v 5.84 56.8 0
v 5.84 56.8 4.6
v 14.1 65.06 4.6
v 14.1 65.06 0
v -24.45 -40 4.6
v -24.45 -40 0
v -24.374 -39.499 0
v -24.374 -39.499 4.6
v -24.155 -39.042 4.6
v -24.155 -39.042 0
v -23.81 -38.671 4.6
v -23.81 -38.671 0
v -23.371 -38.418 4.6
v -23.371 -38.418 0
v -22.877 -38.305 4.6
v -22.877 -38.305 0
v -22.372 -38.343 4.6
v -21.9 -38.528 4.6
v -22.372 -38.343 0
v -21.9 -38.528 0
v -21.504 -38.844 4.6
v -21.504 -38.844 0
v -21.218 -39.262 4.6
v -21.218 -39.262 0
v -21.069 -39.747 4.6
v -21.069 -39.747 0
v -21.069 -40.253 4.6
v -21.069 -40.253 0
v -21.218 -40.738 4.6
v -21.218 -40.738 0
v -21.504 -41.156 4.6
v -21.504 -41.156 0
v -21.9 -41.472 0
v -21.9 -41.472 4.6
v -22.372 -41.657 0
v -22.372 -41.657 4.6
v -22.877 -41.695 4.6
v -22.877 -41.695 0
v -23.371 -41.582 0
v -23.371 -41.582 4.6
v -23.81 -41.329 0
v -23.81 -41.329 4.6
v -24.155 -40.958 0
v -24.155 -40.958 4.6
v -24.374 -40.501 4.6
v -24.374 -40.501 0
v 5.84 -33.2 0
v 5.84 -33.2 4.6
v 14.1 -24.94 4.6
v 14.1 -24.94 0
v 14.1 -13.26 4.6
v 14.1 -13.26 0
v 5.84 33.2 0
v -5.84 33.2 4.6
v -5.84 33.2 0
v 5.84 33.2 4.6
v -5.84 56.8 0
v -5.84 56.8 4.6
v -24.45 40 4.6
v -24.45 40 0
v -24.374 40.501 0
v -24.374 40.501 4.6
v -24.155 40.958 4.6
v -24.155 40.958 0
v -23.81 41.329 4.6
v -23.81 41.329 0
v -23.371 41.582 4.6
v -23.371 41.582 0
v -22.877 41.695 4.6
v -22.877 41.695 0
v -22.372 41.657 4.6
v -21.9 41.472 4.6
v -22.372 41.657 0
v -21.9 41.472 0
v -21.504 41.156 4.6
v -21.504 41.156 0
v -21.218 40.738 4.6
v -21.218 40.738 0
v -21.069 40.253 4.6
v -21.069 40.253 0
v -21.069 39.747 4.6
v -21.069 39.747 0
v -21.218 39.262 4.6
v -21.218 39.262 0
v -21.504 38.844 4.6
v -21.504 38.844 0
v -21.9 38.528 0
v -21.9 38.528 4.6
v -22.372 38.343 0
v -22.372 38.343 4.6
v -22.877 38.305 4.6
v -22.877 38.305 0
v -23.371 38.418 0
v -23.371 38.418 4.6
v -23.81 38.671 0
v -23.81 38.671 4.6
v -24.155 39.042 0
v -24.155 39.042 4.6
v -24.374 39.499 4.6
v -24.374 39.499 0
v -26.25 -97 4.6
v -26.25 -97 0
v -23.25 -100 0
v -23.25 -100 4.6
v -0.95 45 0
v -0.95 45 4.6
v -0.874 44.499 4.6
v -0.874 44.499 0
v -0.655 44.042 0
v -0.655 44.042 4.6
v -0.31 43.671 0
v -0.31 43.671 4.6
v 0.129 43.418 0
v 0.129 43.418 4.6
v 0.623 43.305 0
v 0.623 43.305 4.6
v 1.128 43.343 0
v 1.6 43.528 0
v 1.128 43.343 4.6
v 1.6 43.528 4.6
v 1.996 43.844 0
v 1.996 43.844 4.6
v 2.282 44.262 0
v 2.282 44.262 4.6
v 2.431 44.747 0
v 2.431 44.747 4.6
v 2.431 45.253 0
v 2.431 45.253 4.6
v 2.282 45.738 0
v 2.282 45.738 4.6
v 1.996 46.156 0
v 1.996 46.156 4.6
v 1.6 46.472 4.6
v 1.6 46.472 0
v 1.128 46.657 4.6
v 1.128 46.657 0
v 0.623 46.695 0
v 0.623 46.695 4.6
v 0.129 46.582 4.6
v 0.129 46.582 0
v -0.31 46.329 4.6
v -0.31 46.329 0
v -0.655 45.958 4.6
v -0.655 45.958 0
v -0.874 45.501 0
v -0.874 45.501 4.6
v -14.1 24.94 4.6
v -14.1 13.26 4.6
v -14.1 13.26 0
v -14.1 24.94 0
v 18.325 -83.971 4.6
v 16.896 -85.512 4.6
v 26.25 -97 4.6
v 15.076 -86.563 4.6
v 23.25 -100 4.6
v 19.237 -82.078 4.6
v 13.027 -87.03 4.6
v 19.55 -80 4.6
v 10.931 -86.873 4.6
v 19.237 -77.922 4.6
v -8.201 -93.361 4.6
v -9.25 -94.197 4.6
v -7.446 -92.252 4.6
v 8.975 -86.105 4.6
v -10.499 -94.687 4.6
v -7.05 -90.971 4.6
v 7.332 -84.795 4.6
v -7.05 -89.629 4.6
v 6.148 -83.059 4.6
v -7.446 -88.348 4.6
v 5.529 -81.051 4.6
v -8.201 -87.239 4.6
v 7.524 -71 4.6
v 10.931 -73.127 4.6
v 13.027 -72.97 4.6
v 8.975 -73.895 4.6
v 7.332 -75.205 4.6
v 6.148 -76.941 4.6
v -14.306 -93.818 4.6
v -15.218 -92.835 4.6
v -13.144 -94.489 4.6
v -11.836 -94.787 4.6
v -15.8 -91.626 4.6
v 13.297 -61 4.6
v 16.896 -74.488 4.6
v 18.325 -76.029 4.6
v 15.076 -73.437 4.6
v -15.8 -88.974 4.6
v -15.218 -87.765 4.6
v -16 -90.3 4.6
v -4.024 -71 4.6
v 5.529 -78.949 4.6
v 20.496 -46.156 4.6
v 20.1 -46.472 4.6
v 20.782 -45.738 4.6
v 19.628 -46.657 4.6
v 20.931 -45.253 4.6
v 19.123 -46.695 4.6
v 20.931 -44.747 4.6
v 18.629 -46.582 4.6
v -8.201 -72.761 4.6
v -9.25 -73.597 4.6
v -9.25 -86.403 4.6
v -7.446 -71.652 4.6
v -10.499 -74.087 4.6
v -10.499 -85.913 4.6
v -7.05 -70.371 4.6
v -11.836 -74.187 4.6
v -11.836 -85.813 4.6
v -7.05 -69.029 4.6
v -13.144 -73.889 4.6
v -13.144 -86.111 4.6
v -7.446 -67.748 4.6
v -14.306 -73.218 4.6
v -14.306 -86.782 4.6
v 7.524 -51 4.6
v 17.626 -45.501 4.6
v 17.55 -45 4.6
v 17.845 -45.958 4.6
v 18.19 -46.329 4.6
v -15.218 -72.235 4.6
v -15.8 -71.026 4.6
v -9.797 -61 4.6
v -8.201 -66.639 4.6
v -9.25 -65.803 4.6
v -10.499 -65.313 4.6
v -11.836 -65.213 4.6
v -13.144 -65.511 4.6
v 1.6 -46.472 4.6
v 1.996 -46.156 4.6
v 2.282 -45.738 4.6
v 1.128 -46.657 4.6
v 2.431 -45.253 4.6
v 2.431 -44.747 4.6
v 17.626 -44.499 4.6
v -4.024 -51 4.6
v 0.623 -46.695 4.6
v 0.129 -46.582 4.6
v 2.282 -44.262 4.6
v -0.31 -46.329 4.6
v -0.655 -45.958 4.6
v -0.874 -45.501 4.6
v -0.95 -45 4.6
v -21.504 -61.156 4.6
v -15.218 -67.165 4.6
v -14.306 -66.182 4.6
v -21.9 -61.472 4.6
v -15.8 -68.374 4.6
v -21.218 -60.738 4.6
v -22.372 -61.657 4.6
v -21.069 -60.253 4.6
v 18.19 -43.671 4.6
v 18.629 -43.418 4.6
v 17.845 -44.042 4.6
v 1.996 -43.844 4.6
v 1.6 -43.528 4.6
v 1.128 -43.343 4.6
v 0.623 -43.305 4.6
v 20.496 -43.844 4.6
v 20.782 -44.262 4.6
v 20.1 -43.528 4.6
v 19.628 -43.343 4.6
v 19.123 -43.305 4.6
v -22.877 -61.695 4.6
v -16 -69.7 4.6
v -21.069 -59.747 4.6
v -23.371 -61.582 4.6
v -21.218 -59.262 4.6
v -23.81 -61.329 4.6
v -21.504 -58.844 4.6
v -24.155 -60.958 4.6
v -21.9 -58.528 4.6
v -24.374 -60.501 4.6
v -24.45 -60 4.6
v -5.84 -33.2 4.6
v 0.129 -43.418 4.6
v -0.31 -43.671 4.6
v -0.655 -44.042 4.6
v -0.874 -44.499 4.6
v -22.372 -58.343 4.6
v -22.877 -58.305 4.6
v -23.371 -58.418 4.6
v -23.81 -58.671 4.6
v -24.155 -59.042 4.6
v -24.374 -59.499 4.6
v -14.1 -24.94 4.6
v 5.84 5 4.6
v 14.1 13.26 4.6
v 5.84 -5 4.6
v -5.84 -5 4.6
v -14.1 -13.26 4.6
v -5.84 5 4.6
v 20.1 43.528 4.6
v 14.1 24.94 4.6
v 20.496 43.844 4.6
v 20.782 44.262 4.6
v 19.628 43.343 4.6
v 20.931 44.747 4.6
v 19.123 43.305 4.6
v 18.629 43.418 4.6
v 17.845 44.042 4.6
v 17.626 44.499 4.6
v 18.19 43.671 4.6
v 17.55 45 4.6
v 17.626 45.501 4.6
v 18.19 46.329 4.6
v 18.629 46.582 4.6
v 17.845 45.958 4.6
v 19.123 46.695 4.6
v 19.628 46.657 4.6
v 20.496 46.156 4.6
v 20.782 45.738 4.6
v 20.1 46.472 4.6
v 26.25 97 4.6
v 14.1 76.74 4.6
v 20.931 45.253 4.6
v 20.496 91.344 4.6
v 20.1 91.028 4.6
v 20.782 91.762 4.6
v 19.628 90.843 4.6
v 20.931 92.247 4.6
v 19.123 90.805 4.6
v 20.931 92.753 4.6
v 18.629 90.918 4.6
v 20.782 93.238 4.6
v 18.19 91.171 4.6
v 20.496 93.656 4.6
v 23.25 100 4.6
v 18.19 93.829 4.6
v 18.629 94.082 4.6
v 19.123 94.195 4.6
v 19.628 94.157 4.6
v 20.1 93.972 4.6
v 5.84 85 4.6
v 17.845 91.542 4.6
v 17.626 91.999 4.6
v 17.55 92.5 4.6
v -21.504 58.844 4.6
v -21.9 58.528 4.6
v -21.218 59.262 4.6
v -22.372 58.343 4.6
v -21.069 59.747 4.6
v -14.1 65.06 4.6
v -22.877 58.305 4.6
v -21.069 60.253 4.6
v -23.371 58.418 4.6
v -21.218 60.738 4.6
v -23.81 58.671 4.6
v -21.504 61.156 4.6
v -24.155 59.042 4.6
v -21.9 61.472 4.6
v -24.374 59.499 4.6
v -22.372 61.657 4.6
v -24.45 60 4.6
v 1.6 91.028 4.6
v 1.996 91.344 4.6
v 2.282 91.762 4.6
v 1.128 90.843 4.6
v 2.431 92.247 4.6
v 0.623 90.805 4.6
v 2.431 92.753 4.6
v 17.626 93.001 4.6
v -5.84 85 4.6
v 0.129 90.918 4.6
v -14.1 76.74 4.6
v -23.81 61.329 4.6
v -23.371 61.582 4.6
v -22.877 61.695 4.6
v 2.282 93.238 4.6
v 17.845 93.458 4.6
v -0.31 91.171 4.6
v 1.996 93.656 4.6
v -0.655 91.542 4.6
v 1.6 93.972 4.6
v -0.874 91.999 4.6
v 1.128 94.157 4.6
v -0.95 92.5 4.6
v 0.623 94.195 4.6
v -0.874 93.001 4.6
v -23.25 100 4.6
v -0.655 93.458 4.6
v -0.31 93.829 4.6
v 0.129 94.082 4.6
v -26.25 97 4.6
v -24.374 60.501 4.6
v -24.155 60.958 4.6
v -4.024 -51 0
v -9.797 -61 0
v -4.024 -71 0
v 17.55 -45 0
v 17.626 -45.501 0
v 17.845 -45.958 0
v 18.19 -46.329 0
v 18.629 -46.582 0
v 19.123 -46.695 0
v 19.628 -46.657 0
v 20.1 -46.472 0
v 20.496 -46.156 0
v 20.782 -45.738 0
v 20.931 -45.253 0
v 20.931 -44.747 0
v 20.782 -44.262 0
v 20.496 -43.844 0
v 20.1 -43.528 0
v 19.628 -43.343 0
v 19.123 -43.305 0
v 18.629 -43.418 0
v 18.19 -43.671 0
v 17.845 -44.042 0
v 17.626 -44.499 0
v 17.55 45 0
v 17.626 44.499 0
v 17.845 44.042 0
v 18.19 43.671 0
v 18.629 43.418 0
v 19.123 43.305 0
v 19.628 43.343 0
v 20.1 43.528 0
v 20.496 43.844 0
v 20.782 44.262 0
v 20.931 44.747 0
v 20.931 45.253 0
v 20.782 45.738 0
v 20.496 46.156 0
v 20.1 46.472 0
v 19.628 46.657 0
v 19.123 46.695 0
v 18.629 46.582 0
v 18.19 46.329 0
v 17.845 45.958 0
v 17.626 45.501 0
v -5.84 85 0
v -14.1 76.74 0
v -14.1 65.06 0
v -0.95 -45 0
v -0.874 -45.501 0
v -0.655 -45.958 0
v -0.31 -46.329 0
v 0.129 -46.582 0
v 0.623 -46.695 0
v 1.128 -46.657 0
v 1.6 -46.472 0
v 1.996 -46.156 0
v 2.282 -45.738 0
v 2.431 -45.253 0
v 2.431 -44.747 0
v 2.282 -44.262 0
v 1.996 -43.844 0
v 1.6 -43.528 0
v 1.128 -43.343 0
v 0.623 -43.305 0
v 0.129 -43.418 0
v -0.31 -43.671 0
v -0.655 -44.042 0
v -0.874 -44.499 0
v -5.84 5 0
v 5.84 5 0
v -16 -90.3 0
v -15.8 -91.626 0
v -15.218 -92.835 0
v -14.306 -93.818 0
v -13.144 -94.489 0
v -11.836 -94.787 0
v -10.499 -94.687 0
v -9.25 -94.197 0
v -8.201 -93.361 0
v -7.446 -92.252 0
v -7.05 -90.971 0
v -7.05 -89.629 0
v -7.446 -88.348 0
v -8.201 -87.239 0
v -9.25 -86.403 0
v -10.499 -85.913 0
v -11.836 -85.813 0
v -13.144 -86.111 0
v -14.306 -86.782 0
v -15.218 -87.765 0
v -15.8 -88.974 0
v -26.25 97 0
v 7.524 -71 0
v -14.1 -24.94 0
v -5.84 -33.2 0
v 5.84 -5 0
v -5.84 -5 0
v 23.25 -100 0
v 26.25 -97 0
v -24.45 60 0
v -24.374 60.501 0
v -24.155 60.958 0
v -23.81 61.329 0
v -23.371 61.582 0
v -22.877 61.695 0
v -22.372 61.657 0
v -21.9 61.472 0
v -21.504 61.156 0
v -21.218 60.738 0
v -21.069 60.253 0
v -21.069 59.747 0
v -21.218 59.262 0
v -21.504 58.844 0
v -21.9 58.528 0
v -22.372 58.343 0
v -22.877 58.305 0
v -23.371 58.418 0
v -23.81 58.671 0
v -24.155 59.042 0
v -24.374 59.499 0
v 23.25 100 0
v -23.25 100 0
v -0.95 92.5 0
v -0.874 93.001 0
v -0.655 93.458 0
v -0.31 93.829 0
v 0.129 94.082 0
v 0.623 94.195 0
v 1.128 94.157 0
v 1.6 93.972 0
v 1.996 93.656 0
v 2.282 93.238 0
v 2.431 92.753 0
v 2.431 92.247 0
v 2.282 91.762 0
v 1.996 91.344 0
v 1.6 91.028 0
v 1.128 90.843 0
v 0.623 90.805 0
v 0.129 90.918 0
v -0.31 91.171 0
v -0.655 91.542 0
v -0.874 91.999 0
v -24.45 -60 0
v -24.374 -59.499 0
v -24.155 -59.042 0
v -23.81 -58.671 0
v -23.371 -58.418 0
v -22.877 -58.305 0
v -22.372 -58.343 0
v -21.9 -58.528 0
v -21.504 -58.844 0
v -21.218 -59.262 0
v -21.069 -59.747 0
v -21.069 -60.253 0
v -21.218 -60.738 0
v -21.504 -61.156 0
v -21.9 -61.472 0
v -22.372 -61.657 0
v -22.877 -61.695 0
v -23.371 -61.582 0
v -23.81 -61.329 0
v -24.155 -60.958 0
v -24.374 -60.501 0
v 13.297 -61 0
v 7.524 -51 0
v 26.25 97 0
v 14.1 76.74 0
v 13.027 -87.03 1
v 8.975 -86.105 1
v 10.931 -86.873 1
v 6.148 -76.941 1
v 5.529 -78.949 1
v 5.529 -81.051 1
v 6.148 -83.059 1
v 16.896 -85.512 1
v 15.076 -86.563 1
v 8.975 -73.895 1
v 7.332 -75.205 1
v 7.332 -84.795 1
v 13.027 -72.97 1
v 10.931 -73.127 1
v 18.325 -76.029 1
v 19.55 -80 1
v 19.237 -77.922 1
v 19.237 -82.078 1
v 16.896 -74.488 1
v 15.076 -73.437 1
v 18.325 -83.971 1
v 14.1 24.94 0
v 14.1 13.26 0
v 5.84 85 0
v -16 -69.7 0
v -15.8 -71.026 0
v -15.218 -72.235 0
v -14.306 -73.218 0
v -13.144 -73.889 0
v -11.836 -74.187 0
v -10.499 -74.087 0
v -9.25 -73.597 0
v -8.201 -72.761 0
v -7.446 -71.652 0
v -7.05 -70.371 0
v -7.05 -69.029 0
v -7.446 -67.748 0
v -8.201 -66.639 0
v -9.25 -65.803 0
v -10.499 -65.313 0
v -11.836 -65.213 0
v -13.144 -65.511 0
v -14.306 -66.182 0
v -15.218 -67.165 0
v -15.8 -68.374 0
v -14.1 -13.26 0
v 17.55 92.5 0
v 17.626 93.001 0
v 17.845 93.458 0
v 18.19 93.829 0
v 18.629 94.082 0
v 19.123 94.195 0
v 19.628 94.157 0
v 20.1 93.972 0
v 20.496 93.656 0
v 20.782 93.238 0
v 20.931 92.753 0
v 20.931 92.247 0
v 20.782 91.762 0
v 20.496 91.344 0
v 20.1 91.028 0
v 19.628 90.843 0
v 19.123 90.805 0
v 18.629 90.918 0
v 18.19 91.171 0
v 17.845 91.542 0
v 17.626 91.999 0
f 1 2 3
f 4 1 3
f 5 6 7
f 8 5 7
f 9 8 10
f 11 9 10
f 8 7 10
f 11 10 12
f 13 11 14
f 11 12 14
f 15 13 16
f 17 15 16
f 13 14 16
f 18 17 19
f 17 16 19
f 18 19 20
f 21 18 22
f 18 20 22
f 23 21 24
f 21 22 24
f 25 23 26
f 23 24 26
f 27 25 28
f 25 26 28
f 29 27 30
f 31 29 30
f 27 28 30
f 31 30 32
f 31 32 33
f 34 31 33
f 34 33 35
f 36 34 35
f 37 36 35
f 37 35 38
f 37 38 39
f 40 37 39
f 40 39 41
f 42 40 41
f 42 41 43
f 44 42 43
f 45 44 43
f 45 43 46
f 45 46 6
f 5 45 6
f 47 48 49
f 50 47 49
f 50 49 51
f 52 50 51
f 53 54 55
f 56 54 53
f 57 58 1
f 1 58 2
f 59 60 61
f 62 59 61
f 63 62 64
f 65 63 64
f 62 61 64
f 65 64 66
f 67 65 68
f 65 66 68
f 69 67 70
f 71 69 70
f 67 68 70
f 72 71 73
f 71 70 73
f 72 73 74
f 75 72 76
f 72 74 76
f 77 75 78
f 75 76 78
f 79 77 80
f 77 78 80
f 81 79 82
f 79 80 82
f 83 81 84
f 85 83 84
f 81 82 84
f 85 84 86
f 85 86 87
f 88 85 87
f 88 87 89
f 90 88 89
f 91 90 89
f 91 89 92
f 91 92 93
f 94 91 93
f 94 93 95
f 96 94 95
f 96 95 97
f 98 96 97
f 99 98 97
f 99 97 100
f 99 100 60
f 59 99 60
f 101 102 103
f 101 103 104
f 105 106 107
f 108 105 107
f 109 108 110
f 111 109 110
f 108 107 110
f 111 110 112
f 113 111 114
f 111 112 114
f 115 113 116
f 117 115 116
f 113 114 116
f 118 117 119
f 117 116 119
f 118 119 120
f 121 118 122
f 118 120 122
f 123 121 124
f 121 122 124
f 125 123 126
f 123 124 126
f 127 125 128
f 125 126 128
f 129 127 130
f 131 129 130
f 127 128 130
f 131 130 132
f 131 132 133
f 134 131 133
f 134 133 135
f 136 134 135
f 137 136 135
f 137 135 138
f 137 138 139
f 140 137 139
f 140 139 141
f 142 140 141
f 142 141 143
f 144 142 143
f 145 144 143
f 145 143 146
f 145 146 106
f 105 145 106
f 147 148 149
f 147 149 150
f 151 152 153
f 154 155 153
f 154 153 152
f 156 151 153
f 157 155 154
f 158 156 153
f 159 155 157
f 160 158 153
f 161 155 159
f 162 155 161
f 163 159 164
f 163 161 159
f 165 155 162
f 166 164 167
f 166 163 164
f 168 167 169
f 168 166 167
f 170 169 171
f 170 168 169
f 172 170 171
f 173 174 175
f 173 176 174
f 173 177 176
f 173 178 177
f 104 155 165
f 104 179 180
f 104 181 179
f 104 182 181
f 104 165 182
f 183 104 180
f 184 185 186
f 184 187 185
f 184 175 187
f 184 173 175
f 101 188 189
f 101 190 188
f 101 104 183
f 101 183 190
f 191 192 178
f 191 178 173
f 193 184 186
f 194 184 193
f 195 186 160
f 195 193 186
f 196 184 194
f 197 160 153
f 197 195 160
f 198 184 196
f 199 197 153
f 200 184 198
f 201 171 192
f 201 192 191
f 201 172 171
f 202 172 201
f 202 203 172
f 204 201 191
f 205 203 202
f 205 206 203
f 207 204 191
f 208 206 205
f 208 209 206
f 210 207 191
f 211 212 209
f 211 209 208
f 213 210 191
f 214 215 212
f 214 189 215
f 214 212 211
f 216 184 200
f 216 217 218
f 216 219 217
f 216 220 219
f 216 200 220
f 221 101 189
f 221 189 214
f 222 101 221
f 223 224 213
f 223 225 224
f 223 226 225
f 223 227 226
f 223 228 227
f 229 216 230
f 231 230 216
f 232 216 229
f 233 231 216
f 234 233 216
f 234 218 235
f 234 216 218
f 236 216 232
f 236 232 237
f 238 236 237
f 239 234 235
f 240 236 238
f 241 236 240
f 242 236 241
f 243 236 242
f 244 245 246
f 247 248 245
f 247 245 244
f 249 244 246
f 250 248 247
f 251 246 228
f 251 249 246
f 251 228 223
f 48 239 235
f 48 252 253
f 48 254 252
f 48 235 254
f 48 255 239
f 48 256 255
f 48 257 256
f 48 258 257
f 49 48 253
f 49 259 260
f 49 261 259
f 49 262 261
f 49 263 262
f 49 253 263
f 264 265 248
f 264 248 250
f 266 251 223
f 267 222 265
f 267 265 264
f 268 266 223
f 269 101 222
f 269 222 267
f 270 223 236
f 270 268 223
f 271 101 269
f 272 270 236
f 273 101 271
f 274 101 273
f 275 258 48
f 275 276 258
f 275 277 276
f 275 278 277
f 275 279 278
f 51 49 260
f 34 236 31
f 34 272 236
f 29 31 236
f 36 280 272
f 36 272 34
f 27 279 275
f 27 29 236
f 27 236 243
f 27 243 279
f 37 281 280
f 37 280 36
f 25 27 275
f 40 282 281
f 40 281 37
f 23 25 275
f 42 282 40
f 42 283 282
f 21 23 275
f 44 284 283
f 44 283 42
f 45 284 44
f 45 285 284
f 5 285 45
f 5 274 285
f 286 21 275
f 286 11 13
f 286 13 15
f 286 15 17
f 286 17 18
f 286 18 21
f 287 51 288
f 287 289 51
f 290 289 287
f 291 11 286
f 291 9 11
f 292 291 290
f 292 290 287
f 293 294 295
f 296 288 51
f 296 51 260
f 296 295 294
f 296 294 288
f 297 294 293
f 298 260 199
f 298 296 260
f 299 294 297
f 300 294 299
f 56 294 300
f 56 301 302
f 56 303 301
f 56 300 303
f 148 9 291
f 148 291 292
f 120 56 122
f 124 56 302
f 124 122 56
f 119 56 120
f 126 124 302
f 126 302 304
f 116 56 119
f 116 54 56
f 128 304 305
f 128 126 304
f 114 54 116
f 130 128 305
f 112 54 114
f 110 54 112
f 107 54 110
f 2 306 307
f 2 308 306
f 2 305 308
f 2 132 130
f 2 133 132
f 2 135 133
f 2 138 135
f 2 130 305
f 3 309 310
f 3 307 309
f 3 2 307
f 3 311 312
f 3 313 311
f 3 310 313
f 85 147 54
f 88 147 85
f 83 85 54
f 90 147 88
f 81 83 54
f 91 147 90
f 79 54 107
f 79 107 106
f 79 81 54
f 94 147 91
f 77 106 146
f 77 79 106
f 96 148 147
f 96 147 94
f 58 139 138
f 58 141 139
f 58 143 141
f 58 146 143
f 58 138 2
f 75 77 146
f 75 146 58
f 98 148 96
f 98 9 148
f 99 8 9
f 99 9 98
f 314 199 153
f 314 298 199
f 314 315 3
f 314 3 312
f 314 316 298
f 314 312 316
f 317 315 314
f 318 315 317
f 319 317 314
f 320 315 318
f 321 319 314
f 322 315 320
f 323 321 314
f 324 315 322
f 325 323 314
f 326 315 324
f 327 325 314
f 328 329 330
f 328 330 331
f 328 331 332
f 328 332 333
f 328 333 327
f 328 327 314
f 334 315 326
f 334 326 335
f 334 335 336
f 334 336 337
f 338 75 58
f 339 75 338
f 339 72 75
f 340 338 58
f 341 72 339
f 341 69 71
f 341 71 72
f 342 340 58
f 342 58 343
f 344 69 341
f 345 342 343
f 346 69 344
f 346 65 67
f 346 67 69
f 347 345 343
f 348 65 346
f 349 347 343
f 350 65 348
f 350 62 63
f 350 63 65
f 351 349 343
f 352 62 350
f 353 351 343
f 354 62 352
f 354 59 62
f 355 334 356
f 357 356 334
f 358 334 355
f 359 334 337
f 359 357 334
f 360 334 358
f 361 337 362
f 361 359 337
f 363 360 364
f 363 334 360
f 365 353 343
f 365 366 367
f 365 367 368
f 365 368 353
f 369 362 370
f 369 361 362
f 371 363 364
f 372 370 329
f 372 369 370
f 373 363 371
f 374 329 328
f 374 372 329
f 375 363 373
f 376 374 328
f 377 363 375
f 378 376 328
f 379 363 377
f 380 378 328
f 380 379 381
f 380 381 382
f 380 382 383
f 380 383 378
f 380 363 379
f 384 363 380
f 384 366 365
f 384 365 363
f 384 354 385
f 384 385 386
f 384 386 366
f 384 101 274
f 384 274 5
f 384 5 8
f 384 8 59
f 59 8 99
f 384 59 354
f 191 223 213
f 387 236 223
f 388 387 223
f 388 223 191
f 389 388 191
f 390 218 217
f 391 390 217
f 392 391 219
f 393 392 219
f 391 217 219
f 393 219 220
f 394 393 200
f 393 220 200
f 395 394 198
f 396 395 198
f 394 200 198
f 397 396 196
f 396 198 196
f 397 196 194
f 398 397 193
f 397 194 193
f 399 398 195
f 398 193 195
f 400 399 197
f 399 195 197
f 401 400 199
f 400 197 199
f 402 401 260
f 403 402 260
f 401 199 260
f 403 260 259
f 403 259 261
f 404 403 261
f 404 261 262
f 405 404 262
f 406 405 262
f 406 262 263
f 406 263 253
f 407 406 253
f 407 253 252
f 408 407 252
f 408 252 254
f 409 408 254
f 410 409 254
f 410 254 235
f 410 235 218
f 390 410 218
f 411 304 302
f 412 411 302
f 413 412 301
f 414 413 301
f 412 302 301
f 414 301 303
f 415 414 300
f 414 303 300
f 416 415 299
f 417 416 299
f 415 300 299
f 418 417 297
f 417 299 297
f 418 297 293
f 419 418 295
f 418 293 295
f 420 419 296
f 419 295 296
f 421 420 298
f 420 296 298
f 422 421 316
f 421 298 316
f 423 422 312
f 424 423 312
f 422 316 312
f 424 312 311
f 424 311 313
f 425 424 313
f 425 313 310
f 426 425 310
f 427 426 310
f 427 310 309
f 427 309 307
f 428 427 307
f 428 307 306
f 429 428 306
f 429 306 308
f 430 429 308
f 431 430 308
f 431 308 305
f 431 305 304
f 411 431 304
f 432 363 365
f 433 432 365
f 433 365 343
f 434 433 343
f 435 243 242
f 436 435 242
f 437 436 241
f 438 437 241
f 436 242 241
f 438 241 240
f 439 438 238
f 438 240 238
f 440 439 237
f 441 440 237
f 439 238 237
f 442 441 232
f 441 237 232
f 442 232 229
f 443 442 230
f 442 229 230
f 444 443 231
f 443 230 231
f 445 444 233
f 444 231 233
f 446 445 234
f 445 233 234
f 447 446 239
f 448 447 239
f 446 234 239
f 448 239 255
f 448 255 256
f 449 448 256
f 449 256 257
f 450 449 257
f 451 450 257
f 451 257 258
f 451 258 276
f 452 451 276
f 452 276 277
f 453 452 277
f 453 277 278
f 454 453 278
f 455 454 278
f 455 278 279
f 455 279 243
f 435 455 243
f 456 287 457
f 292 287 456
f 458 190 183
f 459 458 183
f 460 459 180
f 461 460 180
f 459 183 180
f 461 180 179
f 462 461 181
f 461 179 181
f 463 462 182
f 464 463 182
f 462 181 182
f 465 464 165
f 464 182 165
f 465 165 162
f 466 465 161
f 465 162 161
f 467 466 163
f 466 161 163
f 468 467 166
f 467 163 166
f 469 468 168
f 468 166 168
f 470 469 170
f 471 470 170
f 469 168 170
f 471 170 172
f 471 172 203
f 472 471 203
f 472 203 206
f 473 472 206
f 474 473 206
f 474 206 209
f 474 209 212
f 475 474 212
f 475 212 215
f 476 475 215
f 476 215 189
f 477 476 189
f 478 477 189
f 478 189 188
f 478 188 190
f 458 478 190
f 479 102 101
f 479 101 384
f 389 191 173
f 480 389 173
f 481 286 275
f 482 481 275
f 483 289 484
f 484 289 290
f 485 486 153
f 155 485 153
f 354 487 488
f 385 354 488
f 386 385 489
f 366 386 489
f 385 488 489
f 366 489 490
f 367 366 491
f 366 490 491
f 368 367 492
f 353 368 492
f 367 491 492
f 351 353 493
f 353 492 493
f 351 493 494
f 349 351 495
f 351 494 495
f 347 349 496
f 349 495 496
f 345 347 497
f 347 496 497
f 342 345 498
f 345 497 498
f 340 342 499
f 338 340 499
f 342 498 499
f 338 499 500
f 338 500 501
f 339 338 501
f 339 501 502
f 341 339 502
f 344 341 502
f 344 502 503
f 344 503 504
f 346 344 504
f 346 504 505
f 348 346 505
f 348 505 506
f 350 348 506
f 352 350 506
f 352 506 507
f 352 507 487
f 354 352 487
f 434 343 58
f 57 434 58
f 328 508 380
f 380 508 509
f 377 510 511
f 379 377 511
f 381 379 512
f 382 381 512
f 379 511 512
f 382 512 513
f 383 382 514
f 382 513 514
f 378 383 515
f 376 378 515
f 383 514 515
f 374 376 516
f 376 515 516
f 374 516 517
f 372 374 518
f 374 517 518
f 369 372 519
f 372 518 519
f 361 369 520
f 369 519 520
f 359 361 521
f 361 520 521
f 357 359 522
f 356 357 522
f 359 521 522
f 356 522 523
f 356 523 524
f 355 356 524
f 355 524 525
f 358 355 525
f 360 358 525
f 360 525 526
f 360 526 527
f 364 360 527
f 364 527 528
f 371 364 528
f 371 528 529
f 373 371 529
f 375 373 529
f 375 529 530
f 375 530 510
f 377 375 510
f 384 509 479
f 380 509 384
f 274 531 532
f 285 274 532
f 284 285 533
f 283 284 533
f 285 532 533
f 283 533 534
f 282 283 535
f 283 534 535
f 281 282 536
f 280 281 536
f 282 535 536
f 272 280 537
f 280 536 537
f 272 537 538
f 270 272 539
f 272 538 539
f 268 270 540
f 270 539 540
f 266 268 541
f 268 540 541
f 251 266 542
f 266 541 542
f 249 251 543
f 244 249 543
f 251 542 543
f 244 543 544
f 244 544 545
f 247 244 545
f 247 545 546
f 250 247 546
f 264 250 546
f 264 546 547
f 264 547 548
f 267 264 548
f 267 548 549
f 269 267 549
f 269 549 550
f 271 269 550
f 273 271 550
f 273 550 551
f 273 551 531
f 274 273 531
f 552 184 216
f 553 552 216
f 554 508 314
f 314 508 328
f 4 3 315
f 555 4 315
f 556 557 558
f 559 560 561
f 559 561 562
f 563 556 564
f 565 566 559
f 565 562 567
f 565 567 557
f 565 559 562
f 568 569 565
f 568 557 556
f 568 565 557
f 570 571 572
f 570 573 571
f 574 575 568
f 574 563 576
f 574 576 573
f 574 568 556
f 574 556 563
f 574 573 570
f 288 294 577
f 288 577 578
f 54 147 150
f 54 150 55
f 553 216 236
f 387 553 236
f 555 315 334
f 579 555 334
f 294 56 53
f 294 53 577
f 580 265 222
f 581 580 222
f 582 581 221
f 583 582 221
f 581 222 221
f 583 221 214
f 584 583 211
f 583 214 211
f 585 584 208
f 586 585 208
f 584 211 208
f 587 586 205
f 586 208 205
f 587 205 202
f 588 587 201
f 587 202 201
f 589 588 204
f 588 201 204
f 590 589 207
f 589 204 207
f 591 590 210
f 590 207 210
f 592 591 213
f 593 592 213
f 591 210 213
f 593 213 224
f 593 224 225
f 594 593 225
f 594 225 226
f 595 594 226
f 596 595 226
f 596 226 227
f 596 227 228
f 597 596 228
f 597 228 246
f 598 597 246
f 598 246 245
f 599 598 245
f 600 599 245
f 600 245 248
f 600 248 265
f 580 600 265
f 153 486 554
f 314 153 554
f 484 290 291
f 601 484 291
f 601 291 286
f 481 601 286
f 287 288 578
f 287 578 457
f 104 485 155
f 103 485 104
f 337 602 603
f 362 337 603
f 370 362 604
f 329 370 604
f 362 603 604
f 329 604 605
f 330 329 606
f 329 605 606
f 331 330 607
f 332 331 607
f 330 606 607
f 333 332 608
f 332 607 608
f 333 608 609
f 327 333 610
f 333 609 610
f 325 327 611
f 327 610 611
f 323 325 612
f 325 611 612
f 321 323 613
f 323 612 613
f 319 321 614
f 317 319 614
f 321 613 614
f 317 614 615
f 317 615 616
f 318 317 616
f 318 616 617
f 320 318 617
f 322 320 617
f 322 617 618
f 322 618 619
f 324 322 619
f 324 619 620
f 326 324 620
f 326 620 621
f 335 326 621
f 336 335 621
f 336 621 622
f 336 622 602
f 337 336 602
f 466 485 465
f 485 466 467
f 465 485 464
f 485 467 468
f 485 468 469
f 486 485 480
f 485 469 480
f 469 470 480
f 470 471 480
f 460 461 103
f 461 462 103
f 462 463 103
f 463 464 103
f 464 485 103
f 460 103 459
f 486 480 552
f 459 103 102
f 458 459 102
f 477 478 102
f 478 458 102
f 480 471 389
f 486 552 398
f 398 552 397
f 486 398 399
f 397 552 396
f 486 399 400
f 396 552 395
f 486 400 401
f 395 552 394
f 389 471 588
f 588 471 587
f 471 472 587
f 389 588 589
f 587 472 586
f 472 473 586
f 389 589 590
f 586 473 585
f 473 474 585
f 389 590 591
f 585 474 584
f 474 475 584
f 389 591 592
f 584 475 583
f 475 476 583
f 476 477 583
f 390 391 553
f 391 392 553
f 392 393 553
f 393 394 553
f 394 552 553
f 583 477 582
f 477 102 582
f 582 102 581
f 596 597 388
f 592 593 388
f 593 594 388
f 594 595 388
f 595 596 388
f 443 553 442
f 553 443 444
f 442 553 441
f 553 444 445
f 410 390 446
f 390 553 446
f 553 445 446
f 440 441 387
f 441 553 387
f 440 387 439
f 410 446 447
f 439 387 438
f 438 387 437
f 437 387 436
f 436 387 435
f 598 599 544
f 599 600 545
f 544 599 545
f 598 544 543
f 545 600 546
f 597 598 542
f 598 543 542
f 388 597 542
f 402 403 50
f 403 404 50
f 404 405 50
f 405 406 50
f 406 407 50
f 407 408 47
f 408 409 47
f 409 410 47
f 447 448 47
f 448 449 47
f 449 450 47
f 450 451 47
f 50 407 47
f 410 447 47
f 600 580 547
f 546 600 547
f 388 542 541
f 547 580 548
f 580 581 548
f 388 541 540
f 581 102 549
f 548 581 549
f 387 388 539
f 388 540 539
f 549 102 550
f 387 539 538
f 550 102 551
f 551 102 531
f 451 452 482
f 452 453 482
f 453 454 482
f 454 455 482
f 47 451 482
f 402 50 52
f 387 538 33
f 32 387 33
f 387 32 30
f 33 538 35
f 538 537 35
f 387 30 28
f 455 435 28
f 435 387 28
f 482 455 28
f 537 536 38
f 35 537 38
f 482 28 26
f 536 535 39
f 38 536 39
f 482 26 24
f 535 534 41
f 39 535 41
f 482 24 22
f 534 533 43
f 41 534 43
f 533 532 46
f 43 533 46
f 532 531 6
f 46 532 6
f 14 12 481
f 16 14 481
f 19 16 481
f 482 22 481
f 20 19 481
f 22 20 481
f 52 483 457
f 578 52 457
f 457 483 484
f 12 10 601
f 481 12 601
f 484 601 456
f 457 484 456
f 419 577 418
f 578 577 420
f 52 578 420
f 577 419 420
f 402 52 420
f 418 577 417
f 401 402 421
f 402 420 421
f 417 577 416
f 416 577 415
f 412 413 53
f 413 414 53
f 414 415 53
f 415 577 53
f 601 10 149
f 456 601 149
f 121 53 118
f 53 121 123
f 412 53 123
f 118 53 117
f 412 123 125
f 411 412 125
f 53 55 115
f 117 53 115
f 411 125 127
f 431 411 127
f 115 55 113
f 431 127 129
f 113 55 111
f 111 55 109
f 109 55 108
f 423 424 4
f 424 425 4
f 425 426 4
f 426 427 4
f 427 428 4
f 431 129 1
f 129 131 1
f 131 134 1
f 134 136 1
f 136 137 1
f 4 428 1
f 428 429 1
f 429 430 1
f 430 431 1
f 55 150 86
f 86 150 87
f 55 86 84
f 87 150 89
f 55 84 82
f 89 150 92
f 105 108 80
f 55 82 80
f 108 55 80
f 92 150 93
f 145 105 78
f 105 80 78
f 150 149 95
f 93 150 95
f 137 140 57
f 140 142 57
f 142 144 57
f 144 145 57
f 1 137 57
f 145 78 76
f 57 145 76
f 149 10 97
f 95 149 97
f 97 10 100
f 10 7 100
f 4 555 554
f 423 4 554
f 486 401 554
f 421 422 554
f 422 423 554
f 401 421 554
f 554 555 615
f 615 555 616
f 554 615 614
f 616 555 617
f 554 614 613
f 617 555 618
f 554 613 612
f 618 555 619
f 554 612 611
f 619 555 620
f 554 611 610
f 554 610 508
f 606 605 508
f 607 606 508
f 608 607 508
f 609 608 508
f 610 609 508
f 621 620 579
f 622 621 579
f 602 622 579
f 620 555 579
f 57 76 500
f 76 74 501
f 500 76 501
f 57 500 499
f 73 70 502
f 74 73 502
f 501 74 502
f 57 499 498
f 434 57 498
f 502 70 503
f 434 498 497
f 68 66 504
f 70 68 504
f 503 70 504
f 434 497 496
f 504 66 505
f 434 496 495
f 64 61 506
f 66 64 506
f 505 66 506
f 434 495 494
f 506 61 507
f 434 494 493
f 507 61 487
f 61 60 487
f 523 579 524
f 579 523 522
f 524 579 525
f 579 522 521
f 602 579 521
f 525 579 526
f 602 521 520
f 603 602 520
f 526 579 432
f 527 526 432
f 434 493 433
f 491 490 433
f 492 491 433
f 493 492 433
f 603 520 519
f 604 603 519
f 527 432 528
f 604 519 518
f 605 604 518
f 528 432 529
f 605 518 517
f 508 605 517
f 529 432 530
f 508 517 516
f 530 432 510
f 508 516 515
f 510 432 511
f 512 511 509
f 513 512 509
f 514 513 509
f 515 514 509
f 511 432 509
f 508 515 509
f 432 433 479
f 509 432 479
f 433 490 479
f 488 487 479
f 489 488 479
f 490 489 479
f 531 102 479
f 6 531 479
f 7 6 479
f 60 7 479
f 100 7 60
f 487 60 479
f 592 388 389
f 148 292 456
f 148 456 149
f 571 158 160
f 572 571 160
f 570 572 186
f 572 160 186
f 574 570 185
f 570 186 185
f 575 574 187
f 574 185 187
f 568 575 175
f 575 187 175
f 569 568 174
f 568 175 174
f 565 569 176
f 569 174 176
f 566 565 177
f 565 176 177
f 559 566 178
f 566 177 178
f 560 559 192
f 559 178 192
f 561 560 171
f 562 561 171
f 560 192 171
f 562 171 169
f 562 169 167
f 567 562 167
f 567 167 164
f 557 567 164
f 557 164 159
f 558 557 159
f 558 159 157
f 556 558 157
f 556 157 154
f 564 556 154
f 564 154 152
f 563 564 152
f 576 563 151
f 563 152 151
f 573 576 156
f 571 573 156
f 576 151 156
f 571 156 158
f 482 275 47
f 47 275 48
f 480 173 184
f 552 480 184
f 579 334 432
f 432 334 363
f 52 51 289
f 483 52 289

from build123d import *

# Parameters (mm, degrees)
CROQUIS1_W                   = 200
CROQUIS1_H                   = 52.5
SALIENTE_EXTRUIR1_DEPTH      = 4.6
CROQUIS2_R                   = 7.05
CORTAR_EXTRUIR1_DEPTH        = 3.6
TALADRO_DE_MARGEN_PARA_M31_D = 3.4
CHAFL_N1_SIZE                = 3
TALADRO_DE_MARGEN_PARA_M32_D = 3.4
CORTAR_EXTRUIR2_DEPTH        = 104.490204851
TALADRO_DE_MARGEN_PARA_M33_D = 3.4
TALADRO_DE_MARGEN_PARA_M81_D = 9


with BuildPart() as part:
    # Croquis1 → Saliente-Extruir1 (new body)
    with BuildSketch(Plane(origin=(0, 0, 0), x_dir=(0, 1, 0), z_dir=(0, 0, 1))):
        Rectangle(CROQUIS1_W, CROQUIS1_H)
    extrude(amount=SALIENTE_EXTRUIR1_DEPTH)

    # Croquis2 → Cortar-Extruir1 (cut)
    with BuildSketch(Plane.XY.offset(4.6)):
        with Locations((12.5, -80)):
            Circle(CROQUIS2_R)
    extrude(amount=-CORTAR_EXTRUIR1_DEPTH, mode=Mode.SUBTRACT)

    # Taladro de margen para M31 (through all)
    with Locations(Plane(origin=(0, 0, 0), x_dir=(1, 0, 0), z_dir=(0, 0, -1))):
        with Locations((19.25, -45), (19.25, 45), (0.75, 45), (0.75, -45)):
            Hole(TALADRO_DE_MARGEN_PARA_M31_D / 2)

    # Chaflán1
    chafl_n1_edges = [part.edges().sort_by_distance(p)[0] for p in [
        (26.25, 100, 2.3),
        (26.25, -100, 2.3),
        (-26.25, -100, 2.3),
        (-26.25, 100, 2.3),
    ]]
    chamfer(chafl_n1_edges, length=CHAFL_N1_SIZE)

    # Taladro de margen para M32 (through all)
    with Locations(Plane.XY.offset(4.6)):
        with Locations((-22.75, -60), (-22.75, -40), (-22.75, 40), (-22.75, 60)):
            Hole(TALADRO_DE_MARGEN_PARA_M32_D / 2)

    # Croquis8 → Cortar-Extruir2 (cut, through all)
    with BuildSketch(Plane.XY.offset(4.6)):
        Polygon((-5.840411229, 33.2), (5.840411229, 33.2), (14.1, 24.940411229), (14.1, 13.259588771), (5.840411229, 5), (-5.840411229, 5), (-14.1, 13.259588771), (-14.1, 24.940411229), align=None)
        Polygon((5.840411229, -33.2), (14.1, -24.940411229), (14.1, -13.259588771), (5.840411229, -5), (-5.840411229, -5), (-14.1, -13.259588771), (-14.1, -24.940411229), (-5.840411229, -33.2), align=None)
        Polygon((13.297005384, -61), (7.523502692, -51), (-4.023502692, -51), (-9.797005384, -61), (-4.023502692, -71), (7.523502692, -71), align=None)
        Polygon((5.840411229, 56.8), (14.1, 65.059588771), (14.1, 76.740411229), (5.840411229, 85), (-5.840411229, 85), (-14.1, 76.740411229), (-14.1, 65.059588771), (-5.840411229, 56.8), align=None)
    extrude(amount=-CORTAR_EXTRUIR2_DEPTH, mode=Mode.SUBTRACT)

    # Taladro de margen para M33 (through all)
    with Locations(Plane.XY.offset(4.6)):
        with Locations((0.75, 92.5), (19.25, 92.5)):
            Hole(TALADRO_DE_MARGEN_PARA_M33_D / 2)

    # Taladro de margen para M81 (through all)
    with Locations(Plane(origin=(0, 0, 0), x_dir=(1, 0, 0), z_dir=(0, 0, -1))):
        with Locations((-11.5, 69.7), (-11.5, 90.3)):
            Hole(TALADRO_DE_MARGEN_PARA_M81_D / 2)


solid = part.part
